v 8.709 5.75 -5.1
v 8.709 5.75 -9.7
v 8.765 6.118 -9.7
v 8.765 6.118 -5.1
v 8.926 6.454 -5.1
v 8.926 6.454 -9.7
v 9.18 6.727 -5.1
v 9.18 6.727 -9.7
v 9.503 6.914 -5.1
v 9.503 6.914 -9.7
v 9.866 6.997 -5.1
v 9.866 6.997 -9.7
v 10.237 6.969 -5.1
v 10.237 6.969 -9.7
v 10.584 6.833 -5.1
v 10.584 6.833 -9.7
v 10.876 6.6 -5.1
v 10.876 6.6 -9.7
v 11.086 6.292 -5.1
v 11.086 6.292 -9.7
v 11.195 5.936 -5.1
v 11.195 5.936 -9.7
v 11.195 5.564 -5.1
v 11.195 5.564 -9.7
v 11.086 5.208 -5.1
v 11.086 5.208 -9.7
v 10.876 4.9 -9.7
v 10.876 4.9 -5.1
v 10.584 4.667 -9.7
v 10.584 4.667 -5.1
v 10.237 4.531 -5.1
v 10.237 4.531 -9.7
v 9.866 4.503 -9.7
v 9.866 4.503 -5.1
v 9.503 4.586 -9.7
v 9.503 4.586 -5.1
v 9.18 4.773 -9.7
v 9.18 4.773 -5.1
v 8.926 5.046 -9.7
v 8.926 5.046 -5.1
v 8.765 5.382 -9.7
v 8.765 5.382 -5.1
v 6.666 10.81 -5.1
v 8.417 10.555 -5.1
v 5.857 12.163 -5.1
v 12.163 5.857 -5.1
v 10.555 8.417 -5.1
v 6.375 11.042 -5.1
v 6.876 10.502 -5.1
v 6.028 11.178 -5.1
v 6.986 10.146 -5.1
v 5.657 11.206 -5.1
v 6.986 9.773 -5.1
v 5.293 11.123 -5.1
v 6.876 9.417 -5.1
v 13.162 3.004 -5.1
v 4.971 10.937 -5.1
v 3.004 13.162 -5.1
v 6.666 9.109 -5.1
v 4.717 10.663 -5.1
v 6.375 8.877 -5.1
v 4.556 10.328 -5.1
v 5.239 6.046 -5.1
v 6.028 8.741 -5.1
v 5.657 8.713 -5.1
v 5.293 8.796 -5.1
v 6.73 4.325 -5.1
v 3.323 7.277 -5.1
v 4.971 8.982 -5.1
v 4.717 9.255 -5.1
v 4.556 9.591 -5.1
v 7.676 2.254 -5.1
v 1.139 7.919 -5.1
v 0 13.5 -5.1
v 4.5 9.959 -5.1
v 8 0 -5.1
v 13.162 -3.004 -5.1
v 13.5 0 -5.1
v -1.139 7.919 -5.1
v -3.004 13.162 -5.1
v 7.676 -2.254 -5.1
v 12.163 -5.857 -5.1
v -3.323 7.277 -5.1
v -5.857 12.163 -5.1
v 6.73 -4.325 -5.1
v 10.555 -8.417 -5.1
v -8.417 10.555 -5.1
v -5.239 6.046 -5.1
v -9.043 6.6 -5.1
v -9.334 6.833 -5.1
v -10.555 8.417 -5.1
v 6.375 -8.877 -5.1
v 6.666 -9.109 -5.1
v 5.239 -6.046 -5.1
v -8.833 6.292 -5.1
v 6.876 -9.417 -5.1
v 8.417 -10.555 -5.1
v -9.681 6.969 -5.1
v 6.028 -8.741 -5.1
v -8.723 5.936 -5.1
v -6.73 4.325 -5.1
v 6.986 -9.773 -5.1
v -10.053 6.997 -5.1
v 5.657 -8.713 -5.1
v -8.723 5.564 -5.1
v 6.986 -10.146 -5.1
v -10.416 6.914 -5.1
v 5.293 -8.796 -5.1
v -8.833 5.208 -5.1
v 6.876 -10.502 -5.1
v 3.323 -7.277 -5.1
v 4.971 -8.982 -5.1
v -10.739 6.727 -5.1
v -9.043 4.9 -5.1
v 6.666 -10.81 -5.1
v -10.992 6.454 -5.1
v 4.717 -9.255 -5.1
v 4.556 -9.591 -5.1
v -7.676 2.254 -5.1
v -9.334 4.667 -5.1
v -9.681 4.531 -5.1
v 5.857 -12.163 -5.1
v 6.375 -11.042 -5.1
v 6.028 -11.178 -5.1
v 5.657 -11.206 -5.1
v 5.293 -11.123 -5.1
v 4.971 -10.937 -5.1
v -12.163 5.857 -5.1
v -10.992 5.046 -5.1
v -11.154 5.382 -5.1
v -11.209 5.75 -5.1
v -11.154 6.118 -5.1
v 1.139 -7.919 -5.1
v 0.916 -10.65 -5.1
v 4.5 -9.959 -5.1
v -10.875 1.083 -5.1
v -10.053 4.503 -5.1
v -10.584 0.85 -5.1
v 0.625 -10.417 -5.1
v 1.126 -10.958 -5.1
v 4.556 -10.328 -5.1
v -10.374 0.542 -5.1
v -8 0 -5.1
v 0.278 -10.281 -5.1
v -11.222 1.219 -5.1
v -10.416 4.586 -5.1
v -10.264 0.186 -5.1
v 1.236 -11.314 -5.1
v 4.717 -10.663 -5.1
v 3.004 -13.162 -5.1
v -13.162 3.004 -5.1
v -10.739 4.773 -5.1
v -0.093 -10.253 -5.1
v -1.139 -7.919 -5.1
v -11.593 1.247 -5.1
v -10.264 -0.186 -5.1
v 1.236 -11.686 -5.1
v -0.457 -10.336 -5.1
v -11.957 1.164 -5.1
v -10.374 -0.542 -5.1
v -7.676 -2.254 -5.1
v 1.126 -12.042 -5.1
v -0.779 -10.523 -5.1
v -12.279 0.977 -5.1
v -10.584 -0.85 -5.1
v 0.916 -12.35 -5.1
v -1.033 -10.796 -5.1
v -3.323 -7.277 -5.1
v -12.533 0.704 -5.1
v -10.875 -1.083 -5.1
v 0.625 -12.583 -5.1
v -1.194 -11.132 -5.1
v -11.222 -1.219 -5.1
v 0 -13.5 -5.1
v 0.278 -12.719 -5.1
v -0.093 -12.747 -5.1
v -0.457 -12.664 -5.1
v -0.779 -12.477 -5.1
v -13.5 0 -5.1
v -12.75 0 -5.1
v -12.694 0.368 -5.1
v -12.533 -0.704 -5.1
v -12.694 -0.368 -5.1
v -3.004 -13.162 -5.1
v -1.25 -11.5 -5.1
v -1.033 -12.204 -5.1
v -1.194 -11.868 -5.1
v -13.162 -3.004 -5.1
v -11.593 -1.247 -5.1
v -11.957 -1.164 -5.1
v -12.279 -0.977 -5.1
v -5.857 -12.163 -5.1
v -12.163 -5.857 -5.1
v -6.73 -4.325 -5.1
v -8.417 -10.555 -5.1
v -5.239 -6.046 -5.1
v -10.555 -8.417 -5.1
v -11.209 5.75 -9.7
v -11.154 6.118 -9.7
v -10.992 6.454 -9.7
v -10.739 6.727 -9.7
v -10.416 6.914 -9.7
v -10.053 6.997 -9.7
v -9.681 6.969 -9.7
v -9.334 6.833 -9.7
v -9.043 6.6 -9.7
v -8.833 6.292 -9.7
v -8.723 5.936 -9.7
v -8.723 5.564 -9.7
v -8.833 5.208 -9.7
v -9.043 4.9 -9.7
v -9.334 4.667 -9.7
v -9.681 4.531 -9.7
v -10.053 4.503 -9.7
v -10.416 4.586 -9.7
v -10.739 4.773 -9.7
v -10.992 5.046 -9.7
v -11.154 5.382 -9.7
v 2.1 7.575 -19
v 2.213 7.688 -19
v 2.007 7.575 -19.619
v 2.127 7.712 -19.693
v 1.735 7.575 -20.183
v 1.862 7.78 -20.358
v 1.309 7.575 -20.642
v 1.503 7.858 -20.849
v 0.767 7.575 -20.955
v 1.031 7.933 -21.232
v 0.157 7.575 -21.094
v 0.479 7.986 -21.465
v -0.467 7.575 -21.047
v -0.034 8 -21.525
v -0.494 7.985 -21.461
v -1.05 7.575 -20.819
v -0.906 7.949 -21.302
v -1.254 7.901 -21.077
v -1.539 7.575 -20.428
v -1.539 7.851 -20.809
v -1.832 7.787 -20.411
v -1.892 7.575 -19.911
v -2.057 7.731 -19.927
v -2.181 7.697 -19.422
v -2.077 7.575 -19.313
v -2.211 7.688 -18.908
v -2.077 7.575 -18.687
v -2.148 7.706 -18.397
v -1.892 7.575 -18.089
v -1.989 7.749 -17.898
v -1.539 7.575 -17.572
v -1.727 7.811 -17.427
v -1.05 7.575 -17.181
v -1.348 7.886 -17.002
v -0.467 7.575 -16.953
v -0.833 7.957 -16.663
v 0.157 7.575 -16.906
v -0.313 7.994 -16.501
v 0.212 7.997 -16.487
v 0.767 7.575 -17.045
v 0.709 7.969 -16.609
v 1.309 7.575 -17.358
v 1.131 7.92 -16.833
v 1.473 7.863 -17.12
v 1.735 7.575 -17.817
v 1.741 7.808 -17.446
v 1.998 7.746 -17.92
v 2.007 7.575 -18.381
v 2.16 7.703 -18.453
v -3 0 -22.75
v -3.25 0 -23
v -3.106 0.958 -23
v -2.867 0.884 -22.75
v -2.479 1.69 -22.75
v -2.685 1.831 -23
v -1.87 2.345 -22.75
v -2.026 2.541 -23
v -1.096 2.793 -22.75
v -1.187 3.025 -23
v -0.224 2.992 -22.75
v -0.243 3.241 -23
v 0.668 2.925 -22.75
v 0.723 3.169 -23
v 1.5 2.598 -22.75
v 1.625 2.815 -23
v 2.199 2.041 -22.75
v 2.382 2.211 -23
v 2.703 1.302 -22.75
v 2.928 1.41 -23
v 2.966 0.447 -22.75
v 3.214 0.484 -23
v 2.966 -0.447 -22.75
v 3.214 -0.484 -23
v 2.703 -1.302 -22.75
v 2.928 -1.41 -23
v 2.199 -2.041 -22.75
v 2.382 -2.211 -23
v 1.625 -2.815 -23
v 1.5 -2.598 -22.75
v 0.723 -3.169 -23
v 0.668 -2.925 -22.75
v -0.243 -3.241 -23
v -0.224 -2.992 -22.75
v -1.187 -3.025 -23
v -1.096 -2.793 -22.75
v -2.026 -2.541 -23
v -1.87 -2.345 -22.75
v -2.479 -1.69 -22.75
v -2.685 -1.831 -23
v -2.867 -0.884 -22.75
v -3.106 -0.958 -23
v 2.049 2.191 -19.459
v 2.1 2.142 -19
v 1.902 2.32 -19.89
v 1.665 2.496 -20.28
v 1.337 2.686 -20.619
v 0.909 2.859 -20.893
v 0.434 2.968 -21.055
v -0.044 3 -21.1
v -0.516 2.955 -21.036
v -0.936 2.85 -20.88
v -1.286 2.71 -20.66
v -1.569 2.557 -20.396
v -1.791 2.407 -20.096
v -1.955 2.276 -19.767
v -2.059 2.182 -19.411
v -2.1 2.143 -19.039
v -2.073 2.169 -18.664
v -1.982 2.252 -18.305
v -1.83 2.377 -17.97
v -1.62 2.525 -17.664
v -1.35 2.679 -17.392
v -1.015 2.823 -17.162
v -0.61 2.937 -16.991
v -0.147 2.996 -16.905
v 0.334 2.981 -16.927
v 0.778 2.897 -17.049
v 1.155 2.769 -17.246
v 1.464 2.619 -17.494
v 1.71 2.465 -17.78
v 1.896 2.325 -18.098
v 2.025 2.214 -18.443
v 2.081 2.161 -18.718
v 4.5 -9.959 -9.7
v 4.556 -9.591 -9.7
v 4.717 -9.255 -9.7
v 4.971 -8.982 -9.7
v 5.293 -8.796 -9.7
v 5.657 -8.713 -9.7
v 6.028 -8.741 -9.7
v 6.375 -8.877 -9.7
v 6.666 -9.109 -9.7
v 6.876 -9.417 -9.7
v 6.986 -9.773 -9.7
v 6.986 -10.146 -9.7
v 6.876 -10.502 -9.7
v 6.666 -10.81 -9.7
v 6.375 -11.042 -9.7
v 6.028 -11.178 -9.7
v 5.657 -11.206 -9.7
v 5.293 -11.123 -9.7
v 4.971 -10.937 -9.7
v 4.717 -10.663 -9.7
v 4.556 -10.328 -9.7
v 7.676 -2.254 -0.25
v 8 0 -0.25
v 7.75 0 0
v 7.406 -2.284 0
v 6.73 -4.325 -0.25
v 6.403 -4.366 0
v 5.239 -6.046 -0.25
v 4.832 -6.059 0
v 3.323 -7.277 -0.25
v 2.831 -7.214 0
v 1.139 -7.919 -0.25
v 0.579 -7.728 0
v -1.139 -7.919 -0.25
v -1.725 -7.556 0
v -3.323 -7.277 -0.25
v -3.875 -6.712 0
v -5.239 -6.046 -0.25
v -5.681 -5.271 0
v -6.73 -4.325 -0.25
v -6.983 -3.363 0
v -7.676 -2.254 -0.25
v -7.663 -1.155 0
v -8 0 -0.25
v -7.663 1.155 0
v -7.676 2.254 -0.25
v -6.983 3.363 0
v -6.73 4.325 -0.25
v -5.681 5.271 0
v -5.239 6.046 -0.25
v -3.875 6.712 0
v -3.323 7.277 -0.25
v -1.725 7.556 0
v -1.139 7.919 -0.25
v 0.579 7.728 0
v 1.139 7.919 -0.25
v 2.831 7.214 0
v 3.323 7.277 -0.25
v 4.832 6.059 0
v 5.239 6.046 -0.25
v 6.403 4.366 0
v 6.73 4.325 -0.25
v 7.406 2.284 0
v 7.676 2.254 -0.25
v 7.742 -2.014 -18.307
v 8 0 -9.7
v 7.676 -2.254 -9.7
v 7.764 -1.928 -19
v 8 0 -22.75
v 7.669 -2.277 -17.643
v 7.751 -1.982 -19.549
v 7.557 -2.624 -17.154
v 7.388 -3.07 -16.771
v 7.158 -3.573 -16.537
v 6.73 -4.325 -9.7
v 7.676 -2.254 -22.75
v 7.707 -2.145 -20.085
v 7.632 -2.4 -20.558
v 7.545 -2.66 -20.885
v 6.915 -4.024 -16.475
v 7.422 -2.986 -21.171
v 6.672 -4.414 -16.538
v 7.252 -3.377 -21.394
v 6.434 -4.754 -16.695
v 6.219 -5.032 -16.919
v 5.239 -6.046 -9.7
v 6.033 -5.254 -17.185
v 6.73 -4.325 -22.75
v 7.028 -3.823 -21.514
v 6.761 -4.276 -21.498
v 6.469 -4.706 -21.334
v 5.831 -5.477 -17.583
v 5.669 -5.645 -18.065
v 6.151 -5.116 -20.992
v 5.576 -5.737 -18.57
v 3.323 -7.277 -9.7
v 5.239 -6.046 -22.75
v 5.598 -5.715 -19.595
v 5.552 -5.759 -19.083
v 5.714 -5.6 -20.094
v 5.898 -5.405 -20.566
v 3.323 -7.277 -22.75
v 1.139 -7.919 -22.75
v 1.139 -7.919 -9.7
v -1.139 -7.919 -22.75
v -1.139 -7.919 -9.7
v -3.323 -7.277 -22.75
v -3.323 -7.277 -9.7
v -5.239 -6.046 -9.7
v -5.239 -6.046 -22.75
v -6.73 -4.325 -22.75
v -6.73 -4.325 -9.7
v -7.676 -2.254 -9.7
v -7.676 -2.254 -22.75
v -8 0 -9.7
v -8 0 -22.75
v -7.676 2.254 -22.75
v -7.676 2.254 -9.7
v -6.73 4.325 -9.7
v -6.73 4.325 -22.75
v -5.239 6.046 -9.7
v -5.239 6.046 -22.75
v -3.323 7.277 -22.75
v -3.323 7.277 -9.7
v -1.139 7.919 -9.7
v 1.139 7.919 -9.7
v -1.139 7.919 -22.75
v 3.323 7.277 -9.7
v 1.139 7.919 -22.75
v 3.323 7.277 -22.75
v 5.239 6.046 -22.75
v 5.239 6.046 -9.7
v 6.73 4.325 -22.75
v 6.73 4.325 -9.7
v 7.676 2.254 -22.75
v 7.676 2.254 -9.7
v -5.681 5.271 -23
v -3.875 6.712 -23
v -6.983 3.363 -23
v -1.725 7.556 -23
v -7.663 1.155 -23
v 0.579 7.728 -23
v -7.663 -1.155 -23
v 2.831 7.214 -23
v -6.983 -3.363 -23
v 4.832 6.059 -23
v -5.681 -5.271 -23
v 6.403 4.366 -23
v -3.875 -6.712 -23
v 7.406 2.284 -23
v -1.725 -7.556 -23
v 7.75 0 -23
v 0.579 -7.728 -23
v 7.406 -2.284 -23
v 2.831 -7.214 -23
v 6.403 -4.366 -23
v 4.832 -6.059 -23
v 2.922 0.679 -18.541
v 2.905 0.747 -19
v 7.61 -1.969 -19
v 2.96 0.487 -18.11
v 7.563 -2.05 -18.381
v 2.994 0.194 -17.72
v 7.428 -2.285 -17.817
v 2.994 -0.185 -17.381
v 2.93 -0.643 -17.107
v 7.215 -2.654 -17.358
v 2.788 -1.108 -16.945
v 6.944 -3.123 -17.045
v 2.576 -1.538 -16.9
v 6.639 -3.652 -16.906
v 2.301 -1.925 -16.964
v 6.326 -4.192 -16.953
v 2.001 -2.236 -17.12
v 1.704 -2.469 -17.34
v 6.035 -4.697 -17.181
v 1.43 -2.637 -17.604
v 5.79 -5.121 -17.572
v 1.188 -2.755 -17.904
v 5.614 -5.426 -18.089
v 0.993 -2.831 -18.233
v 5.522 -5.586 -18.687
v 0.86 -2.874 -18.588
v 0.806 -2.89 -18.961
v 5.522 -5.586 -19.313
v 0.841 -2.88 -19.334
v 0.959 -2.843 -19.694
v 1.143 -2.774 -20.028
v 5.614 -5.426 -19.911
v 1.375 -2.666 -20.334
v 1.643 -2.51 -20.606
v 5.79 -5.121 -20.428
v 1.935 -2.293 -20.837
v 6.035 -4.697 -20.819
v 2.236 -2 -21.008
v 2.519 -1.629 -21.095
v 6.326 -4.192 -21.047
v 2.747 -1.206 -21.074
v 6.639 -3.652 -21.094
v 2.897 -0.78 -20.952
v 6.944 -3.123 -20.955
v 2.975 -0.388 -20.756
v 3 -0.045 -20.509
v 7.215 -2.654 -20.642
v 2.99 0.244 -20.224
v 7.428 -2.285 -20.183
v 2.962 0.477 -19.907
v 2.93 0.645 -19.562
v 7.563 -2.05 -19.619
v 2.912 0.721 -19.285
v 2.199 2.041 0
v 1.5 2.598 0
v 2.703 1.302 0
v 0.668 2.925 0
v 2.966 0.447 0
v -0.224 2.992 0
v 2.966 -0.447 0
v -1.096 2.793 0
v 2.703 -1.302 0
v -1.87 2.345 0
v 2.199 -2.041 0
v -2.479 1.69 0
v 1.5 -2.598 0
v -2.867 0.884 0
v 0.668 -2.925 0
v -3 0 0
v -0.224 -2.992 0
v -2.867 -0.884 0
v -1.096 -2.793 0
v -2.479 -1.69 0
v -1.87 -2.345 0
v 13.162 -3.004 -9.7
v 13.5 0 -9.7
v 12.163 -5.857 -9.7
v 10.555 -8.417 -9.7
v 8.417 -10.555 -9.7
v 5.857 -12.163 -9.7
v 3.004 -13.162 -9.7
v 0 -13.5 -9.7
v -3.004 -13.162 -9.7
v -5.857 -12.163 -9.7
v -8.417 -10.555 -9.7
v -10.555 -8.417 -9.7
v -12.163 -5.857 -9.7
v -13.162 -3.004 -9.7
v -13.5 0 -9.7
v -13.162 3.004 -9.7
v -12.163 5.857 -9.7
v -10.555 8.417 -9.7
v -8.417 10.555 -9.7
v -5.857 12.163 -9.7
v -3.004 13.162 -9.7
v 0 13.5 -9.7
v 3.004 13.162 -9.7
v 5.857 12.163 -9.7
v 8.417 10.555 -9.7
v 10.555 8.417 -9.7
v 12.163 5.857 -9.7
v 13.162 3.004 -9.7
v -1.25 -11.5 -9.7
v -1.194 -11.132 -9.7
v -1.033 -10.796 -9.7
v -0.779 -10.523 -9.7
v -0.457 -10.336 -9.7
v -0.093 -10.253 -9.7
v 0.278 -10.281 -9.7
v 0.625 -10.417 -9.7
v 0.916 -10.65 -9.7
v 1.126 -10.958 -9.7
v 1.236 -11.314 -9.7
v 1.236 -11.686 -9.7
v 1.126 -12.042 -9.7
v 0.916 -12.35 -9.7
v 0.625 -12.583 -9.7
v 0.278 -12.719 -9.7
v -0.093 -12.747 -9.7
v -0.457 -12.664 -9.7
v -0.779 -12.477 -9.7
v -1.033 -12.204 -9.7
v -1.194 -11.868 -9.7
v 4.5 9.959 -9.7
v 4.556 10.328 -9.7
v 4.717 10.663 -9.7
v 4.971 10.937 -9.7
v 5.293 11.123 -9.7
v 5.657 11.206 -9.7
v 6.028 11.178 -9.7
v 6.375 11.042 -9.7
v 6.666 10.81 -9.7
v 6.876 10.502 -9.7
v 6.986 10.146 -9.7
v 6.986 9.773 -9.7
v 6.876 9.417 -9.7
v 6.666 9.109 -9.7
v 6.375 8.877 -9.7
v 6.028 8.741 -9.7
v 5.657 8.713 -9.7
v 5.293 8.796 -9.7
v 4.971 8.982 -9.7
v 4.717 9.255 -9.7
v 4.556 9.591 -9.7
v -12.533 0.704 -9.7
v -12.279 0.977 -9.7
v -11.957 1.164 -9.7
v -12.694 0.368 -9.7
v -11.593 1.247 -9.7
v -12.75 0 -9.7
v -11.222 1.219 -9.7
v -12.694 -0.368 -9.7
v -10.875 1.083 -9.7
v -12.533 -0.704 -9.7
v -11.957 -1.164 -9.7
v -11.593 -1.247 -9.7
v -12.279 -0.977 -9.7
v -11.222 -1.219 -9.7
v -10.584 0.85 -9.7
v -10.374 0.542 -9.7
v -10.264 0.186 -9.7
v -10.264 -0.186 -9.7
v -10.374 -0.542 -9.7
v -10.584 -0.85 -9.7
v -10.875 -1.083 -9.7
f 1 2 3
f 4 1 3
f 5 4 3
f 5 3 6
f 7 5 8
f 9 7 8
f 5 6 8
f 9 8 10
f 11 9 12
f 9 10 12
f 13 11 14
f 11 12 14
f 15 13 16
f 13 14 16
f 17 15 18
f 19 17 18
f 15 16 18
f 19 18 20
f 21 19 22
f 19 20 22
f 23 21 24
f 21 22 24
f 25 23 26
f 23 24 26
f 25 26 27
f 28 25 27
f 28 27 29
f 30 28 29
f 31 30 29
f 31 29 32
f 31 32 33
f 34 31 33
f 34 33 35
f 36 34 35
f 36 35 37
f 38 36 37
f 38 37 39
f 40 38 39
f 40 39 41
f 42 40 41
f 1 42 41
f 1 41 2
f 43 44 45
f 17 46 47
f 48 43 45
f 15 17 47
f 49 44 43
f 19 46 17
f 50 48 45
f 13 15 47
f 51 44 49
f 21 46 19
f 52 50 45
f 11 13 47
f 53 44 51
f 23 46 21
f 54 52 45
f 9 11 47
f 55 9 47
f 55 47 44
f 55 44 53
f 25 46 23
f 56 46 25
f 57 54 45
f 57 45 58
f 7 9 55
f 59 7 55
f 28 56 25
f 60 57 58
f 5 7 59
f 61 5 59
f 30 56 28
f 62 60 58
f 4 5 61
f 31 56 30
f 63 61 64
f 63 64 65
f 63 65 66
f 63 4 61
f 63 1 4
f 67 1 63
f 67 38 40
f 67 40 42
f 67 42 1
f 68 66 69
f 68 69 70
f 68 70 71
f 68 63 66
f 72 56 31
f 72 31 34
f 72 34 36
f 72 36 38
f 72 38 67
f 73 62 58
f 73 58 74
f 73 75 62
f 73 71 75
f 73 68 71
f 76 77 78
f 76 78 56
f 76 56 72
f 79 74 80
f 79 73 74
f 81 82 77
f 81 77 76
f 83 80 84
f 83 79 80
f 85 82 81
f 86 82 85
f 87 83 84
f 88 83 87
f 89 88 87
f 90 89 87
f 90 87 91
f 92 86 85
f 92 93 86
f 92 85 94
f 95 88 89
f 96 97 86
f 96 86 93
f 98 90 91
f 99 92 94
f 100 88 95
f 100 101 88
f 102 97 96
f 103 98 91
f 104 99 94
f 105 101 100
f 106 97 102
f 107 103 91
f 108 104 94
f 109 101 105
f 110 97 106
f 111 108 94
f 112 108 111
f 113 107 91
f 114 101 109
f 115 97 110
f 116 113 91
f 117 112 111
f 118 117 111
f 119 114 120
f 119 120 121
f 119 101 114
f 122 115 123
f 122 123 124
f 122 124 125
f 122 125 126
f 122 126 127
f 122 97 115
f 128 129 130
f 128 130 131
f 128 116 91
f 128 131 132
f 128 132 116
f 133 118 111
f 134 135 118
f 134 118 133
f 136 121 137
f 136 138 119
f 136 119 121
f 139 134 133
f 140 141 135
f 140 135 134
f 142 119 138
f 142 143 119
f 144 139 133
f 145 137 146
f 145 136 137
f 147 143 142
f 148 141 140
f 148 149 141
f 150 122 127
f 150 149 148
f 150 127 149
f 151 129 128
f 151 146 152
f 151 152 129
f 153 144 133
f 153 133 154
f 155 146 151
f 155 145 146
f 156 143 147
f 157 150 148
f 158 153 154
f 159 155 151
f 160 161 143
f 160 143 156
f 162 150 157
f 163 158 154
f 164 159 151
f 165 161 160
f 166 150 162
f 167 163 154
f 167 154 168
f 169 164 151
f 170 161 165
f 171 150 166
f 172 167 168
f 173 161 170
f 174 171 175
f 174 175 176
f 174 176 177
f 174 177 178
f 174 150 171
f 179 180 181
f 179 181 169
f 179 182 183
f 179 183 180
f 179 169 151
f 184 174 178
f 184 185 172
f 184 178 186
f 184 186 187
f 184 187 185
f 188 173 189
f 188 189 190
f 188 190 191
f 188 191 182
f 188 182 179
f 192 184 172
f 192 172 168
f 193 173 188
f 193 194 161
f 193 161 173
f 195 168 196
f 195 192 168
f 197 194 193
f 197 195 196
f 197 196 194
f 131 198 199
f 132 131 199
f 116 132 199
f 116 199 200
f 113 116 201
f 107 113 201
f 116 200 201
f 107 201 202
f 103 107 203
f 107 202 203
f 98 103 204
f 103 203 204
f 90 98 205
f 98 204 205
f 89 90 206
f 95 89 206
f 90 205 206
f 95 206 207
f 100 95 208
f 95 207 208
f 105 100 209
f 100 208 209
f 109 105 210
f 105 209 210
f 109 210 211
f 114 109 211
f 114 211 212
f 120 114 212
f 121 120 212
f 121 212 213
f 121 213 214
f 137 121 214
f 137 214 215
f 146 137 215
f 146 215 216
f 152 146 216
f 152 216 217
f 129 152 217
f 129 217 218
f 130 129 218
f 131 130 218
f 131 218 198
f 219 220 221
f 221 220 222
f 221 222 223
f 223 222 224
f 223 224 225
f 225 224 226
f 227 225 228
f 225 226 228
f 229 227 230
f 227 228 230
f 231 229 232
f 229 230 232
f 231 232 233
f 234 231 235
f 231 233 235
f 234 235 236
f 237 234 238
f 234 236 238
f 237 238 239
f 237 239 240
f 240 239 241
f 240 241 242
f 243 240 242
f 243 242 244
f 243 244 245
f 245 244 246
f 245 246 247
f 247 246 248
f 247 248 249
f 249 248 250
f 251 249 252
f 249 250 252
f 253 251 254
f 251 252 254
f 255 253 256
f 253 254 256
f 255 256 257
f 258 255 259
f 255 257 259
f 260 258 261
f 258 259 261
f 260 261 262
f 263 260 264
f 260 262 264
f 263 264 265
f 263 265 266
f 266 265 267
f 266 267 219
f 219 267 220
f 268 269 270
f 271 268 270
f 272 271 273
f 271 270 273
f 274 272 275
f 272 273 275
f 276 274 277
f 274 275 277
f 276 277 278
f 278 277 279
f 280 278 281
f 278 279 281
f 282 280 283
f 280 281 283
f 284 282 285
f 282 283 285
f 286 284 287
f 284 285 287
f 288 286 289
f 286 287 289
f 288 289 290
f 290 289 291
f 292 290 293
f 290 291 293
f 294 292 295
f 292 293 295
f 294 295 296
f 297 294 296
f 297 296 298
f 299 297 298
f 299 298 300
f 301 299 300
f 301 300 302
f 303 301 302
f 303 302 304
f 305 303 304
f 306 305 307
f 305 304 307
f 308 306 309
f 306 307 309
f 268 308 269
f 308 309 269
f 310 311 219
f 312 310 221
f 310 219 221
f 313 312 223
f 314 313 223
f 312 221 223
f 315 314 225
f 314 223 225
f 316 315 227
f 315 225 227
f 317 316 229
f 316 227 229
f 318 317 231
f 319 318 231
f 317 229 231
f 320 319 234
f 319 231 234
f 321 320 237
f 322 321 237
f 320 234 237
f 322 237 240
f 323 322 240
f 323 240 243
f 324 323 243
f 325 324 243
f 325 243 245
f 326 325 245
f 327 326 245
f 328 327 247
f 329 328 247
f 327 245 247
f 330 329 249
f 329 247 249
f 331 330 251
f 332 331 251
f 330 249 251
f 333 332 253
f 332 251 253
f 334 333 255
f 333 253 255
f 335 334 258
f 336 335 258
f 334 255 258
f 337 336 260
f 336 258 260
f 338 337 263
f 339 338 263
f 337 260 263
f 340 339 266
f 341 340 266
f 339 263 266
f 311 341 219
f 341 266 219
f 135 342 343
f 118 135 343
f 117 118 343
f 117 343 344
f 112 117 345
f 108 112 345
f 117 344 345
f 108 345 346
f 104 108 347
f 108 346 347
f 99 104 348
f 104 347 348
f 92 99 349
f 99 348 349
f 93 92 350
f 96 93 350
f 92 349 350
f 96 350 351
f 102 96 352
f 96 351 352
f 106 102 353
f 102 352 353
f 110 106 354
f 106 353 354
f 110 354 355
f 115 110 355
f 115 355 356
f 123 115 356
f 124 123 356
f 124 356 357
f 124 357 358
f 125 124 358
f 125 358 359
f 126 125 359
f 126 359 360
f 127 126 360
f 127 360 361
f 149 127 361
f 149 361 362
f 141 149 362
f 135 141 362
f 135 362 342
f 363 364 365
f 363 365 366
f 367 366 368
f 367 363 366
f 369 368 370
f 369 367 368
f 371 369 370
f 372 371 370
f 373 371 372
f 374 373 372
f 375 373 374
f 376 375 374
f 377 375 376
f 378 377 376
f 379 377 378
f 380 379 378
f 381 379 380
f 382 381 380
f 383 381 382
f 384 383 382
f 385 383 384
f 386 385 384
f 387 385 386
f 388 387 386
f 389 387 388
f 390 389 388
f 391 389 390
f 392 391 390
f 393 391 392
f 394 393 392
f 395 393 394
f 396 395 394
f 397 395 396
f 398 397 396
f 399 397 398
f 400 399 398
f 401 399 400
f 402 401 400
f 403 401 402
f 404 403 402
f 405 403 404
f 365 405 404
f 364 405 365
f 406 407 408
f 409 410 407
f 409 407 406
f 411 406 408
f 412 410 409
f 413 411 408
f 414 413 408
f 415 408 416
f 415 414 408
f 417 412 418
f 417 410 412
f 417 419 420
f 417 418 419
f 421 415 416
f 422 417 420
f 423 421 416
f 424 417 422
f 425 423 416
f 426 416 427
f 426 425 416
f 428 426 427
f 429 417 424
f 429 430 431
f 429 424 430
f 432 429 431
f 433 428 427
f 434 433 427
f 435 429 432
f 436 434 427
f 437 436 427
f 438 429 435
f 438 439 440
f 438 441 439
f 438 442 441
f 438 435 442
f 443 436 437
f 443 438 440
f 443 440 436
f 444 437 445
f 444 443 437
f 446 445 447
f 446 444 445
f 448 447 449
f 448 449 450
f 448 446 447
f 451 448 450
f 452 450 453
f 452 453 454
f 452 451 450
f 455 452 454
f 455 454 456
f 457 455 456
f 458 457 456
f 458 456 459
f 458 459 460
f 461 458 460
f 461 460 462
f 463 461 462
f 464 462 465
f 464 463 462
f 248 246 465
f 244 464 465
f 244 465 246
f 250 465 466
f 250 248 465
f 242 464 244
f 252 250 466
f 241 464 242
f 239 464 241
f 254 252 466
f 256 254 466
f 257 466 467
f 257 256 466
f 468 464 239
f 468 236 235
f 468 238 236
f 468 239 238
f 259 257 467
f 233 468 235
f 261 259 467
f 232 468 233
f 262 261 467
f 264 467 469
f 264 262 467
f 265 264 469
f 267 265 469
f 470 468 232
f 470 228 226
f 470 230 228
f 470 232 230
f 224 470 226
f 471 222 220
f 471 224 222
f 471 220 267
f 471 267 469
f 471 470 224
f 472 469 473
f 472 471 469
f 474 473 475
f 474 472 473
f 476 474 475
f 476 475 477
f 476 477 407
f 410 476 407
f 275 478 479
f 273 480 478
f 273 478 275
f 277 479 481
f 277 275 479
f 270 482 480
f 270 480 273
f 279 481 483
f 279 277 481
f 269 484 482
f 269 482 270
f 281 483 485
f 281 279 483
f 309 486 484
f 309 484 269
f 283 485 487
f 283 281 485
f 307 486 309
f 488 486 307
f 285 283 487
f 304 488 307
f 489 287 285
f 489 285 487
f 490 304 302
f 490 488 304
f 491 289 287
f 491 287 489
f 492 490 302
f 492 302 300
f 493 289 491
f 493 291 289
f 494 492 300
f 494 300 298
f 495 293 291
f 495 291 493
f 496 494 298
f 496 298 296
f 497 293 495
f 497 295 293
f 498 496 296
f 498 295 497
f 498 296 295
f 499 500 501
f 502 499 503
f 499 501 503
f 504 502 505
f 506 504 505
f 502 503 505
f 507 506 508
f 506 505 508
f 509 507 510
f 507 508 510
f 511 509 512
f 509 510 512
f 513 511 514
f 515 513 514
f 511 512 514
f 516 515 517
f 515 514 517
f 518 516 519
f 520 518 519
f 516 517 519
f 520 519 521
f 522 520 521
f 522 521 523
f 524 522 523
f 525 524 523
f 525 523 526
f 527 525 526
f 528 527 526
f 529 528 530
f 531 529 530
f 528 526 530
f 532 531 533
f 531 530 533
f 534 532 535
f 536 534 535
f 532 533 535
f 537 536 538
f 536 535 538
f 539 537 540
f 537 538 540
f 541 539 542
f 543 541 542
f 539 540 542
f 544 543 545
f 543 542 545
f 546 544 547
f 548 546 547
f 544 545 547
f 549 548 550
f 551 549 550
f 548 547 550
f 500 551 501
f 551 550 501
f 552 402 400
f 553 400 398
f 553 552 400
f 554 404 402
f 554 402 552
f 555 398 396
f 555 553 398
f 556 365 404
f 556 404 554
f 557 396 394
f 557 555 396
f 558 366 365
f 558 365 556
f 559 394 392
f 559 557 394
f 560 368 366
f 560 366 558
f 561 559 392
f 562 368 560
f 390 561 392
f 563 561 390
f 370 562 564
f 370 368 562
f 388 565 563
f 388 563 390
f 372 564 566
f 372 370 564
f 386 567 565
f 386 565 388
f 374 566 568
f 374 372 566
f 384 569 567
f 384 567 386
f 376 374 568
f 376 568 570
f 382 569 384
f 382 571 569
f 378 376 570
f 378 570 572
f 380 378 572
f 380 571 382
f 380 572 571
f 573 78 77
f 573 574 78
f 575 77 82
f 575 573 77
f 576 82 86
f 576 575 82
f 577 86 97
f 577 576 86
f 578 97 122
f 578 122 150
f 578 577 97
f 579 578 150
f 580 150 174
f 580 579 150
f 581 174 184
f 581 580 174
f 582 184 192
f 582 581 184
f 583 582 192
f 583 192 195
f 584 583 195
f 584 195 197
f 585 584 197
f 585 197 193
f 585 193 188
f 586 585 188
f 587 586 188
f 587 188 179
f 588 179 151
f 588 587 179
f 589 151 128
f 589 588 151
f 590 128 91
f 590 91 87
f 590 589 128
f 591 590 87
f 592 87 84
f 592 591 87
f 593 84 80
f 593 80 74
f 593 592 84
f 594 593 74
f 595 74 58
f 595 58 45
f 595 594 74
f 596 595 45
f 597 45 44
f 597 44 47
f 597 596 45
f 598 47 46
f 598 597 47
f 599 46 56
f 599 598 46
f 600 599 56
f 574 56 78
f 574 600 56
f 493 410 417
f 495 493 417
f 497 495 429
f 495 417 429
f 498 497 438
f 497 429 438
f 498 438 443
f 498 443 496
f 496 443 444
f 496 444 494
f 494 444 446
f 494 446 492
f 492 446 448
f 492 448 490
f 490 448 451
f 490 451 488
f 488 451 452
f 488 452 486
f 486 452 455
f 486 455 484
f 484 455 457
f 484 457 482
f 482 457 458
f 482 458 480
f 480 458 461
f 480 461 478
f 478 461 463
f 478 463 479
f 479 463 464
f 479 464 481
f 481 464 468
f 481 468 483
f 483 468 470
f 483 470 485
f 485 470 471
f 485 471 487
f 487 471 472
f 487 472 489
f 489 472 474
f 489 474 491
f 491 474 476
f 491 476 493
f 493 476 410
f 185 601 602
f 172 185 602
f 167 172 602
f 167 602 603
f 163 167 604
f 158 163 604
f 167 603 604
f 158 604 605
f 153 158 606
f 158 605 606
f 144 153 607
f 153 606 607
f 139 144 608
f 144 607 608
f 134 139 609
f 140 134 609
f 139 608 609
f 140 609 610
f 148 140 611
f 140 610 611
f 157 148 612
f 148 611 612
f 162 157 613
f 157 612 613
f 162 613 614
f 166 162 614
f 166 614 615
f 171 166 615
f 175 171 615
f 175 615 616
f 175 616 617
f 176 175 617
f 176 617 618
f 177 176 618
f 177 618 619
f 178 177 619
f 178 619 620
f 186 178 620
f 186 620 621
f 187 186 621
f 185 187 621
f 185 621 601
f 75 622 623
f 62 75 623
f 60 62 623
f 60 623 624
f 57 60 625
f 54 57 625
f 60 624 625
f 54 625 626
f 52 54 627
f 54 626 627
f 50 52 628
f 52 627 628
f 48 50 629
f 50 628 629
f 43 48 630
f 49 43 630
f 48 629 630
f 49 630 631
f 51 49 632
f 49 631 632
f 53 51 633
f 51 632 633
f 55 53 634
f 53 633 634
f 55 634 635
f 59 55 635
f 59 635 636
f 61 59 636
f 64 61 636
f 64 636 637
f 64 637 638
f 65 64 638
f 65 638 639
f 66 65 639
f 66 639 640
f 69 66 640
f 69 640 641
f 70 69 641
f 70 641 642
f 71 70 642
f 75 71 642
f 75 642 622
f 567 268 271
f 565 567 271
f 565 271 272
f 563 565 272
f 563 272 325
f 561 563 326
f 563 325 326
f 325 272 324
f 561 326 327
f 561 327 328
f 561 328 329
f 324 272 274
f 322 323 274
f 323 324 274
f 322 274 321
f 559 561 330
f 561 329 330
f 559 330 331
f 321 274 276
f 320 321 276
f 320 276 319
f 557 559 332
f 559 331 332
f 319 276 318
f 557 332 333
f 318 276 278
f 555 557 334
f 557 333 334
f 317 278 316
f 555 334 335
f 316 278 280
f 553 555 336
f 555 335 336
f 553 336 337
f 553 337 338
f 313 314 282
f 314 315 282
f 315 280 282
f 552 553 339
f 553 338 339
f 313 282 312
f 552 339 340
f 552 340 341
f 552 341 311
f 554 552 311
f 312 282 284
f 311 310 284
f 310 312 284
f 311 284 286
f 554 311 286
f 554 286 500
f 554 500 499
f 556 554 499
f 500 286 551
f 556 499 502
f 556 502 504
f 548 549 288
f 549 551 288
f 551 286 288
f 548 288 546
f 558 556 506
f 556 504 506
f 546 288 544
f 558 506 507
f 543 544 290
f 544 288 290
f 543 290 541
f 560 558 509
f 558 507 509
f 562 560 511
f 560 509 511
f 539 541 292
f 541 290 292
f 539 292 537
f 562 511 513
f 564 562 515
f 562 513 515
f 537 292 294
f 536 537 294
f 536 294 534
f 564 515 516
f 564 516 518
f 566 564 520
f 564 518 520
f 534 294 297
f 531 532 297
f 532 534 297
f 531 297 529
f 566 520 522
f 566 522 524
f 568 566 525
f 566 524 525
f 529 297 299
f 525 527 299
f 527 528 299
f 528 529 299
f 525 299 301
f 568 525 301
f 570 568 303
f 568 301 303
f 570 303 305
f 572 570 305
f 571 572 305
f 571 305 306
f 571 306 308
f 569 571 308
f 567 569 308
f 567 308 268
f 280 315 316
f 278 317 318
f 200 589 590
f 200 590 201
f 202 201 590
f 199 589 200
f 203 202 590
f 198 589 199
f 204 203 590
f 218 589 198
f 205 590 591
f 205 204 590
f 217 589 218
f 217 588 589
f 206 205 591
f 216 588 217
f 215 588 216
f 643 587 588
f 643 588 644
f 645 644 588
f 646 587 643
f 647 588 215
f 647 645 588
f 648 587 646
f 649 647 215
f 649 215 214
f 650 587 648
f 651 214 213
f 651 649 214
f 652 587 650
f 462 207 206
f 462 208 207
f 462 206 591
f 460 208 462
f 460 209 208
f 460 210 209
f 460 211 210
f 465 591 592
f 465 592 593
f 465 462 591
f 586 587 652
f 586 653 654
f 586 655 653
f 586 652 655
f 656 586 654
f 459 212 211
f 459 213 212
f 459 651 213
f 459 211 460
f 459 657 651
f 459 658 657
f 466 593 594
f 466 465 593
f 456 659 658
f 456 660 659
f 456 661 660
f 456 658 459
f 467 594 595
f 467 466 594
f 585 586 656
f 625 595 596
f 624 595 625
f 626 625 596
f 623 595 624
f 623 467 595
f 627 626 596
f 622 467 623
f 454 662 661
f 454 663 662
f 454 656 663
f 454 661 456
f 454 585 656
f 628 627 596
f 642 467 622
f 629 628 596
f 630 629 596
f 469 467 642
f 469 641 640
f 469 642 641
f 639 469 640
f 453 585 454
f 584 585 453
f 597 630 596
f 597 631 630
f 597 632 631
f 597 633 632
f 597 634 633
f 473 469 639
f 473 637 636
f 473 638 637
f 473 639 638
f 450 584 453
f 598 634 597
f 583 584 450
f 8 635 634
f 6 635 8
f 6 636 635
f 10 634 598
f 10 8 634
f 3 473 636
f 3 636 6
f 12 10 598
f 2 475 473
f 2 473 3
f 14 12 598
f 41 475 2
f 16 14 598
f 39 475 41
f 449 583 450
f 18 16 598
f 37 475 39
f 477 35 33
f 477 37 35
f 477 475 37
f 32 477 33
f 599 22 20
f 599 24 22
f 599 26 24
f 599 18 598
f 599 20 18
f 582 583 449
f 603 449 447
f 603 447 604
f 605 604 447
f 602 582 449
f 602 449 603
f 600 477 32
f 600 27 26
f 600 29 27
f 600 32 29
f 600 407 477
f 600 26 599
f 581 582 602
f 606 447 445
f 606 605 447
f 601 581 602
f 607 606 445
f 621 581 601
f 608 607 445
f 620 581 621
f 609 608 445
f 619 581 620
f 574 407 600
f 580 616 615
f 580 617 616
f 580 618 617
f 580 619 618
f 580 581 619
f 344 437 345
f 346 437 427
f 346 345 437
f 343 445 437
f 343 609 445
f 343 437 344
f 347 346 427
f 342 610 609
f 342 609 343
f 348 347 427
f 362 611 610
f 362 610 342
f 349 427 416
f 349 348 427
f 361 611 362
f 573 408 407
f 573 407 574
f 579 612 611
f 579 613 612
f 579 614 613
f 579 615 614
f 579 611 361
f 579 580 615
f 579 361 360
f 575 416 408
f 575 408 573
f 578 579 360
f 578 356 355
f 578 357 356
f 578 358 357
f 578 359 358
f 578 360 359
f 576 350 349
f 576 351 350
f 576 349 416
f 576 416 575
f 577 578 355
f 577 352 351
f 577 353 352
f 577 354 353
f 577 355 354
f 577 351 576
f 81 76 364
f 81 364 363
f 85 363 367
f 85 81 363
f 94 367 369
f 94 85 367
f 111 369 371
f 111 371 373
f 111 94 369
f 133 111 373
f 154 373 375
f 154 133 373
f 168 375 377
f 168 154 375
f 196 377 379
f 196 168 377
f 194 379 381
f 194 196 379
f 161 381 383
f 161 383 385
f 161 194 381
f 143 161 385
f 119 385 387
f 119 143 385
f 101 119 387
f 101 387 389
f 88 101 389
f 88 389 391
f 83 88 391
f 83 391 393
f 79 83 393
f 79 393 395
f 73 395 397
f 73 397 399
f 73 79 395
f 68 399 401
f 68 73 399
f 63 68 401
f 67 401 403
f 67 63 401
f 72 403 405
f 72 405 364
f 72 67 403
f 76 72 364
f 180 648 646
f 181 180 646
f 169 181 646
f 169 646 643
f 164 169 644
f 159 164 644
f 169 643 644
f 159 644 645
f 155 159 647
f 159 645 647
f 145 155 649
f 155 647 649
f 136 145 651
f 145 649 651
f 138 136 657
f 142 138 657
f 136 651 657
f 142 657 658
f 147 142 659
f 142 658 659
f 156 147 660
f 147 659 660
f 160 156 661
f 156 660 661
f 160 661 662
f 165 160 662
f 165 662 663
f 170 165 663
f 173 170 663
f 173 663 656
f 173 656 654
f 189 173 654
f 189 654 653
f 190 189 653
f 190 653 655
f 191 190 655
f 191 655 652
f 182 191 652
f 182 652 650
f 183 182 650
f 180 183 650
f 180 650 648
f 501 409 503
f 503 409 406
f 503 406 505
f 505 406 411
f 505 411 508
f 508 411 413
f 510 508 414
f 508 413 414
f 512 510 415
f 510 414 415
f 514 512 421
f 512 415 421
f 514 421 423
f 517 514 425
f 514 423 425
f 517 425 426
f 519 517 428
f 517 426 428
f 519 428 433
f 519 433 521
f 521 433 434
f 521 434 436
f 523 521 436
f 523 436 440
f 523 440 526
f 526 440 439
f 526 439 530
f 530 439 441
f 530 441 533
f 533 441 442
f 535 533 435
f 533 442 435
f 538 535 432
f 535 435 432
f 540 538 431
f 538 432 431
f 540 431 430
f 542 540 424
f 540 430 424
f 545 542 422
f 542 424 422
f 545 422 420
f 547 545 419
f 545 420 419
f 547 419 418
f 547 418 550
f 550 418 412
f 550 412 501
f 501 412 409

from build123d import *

# Parameters (mm, degrees)
SKETCH_2_R          = 3
CUT_EXTRUDE_1_DEPTH = 30.891470355
CHAMFER_1_SIZE      = 0.25
HOLE_WIZARD_M3_1_D  = 2.5


# Read off the part's stored shape, not the designer's step: M5 螺纹孔1
with BuildPart() as part:
    # 草图1 → 旋转1 (revolve)
    with BuildSketch(Plane(origin=(0, 0, 0), x_dir=(0, 0, -1), z_dir=(1, 0, 0)), mode=Mode.PRIVATE) as revolve_1_sk:
        Polygon((0, 0), (0, 8), (5.1, 8), (5.1, 13.5), (9.7, 13.5), (9.7, 8), (23, 8), (23, 0), align=None)
    revolve(revolve_1_sk.sketch.rotate(Axis((0, 0, 81.160359106), (0, 0, -1)), 90), axis=Axis((0, 0, 81.160359106), (0, 0, -1)))

    # 草图2 → 切除-拉伸1 (cut, through all)
    with BuildSketch(Plane(origin=(0, 0, -23), x_dir=(-1, 0, 0), z_dir=(0, 0, -1))):
        Circle(SKETCH_2_R)
    extrude(amount=-CUT_EXTRUDE_1_DEPTH, mode=Mode.SUBTRACT)

    # M5 螺纹孔1 outline → M5 螺纹孔1 (revolve, cut)
    with BuildSketch(Plane.XY.offset(-19)):
        Polygon((2.52511429, 8.00011429), (0, 8.00011429), (0, 2.141949197), (2.1, 2.141949197), (2.1, 7.575), align=None)
    revolve(axis=Axis((0, 0, -19), (0, 1, 0)), mode=Mode.SUBTRACT)

    # Hole Wizard M5 _1 2 outline → Hole Wizard M5 _1 2 (revolve, cut)
    with BuildSketch(Plane(origin=(0, 0, -19), x_dir=(0.49999999999999767, 0.86602540378444, 0), z_dir=(0, 0, -1))):
        Polygon((2.525122236, 8.000122236), (0, 8.000122236), (0, 2.1419531), (2.1, 2.1419531), (2.1, 7.575), align=None)
    revolve(axis=Axis((0, 0, -19), (0.8660254037844403, -0.4999999999999978, 0)), mode=Mode.SUBTRACT)

    # 倒角1
    chamfer_1_edges = [part.edges().sort_by_distance(p)[0] for p in [
        (3, 0, -23),
        (-8, 0, -23),
        (-8, 0, 0),
    ]]
    chamfer(chamfer_1_edges, length=CHAMFER_1_SIZE)

    # M3 螺纹孔1 (through all)
    with Locations(Plane(origin=(-11.5, 0, -5.1), x_dir=(1, 0, 0), z_dir=(0, 0, 1))):
        with Locations((0, 0), (17.25, -9.959292144), (17.25, 9.959292144), (1.540707856, 5.75), (11.5, -11.5), (21.459292144, 5.75)):
            Hole(HOLE_WIZARD_M3_1_D / 2)


solid = part.part
